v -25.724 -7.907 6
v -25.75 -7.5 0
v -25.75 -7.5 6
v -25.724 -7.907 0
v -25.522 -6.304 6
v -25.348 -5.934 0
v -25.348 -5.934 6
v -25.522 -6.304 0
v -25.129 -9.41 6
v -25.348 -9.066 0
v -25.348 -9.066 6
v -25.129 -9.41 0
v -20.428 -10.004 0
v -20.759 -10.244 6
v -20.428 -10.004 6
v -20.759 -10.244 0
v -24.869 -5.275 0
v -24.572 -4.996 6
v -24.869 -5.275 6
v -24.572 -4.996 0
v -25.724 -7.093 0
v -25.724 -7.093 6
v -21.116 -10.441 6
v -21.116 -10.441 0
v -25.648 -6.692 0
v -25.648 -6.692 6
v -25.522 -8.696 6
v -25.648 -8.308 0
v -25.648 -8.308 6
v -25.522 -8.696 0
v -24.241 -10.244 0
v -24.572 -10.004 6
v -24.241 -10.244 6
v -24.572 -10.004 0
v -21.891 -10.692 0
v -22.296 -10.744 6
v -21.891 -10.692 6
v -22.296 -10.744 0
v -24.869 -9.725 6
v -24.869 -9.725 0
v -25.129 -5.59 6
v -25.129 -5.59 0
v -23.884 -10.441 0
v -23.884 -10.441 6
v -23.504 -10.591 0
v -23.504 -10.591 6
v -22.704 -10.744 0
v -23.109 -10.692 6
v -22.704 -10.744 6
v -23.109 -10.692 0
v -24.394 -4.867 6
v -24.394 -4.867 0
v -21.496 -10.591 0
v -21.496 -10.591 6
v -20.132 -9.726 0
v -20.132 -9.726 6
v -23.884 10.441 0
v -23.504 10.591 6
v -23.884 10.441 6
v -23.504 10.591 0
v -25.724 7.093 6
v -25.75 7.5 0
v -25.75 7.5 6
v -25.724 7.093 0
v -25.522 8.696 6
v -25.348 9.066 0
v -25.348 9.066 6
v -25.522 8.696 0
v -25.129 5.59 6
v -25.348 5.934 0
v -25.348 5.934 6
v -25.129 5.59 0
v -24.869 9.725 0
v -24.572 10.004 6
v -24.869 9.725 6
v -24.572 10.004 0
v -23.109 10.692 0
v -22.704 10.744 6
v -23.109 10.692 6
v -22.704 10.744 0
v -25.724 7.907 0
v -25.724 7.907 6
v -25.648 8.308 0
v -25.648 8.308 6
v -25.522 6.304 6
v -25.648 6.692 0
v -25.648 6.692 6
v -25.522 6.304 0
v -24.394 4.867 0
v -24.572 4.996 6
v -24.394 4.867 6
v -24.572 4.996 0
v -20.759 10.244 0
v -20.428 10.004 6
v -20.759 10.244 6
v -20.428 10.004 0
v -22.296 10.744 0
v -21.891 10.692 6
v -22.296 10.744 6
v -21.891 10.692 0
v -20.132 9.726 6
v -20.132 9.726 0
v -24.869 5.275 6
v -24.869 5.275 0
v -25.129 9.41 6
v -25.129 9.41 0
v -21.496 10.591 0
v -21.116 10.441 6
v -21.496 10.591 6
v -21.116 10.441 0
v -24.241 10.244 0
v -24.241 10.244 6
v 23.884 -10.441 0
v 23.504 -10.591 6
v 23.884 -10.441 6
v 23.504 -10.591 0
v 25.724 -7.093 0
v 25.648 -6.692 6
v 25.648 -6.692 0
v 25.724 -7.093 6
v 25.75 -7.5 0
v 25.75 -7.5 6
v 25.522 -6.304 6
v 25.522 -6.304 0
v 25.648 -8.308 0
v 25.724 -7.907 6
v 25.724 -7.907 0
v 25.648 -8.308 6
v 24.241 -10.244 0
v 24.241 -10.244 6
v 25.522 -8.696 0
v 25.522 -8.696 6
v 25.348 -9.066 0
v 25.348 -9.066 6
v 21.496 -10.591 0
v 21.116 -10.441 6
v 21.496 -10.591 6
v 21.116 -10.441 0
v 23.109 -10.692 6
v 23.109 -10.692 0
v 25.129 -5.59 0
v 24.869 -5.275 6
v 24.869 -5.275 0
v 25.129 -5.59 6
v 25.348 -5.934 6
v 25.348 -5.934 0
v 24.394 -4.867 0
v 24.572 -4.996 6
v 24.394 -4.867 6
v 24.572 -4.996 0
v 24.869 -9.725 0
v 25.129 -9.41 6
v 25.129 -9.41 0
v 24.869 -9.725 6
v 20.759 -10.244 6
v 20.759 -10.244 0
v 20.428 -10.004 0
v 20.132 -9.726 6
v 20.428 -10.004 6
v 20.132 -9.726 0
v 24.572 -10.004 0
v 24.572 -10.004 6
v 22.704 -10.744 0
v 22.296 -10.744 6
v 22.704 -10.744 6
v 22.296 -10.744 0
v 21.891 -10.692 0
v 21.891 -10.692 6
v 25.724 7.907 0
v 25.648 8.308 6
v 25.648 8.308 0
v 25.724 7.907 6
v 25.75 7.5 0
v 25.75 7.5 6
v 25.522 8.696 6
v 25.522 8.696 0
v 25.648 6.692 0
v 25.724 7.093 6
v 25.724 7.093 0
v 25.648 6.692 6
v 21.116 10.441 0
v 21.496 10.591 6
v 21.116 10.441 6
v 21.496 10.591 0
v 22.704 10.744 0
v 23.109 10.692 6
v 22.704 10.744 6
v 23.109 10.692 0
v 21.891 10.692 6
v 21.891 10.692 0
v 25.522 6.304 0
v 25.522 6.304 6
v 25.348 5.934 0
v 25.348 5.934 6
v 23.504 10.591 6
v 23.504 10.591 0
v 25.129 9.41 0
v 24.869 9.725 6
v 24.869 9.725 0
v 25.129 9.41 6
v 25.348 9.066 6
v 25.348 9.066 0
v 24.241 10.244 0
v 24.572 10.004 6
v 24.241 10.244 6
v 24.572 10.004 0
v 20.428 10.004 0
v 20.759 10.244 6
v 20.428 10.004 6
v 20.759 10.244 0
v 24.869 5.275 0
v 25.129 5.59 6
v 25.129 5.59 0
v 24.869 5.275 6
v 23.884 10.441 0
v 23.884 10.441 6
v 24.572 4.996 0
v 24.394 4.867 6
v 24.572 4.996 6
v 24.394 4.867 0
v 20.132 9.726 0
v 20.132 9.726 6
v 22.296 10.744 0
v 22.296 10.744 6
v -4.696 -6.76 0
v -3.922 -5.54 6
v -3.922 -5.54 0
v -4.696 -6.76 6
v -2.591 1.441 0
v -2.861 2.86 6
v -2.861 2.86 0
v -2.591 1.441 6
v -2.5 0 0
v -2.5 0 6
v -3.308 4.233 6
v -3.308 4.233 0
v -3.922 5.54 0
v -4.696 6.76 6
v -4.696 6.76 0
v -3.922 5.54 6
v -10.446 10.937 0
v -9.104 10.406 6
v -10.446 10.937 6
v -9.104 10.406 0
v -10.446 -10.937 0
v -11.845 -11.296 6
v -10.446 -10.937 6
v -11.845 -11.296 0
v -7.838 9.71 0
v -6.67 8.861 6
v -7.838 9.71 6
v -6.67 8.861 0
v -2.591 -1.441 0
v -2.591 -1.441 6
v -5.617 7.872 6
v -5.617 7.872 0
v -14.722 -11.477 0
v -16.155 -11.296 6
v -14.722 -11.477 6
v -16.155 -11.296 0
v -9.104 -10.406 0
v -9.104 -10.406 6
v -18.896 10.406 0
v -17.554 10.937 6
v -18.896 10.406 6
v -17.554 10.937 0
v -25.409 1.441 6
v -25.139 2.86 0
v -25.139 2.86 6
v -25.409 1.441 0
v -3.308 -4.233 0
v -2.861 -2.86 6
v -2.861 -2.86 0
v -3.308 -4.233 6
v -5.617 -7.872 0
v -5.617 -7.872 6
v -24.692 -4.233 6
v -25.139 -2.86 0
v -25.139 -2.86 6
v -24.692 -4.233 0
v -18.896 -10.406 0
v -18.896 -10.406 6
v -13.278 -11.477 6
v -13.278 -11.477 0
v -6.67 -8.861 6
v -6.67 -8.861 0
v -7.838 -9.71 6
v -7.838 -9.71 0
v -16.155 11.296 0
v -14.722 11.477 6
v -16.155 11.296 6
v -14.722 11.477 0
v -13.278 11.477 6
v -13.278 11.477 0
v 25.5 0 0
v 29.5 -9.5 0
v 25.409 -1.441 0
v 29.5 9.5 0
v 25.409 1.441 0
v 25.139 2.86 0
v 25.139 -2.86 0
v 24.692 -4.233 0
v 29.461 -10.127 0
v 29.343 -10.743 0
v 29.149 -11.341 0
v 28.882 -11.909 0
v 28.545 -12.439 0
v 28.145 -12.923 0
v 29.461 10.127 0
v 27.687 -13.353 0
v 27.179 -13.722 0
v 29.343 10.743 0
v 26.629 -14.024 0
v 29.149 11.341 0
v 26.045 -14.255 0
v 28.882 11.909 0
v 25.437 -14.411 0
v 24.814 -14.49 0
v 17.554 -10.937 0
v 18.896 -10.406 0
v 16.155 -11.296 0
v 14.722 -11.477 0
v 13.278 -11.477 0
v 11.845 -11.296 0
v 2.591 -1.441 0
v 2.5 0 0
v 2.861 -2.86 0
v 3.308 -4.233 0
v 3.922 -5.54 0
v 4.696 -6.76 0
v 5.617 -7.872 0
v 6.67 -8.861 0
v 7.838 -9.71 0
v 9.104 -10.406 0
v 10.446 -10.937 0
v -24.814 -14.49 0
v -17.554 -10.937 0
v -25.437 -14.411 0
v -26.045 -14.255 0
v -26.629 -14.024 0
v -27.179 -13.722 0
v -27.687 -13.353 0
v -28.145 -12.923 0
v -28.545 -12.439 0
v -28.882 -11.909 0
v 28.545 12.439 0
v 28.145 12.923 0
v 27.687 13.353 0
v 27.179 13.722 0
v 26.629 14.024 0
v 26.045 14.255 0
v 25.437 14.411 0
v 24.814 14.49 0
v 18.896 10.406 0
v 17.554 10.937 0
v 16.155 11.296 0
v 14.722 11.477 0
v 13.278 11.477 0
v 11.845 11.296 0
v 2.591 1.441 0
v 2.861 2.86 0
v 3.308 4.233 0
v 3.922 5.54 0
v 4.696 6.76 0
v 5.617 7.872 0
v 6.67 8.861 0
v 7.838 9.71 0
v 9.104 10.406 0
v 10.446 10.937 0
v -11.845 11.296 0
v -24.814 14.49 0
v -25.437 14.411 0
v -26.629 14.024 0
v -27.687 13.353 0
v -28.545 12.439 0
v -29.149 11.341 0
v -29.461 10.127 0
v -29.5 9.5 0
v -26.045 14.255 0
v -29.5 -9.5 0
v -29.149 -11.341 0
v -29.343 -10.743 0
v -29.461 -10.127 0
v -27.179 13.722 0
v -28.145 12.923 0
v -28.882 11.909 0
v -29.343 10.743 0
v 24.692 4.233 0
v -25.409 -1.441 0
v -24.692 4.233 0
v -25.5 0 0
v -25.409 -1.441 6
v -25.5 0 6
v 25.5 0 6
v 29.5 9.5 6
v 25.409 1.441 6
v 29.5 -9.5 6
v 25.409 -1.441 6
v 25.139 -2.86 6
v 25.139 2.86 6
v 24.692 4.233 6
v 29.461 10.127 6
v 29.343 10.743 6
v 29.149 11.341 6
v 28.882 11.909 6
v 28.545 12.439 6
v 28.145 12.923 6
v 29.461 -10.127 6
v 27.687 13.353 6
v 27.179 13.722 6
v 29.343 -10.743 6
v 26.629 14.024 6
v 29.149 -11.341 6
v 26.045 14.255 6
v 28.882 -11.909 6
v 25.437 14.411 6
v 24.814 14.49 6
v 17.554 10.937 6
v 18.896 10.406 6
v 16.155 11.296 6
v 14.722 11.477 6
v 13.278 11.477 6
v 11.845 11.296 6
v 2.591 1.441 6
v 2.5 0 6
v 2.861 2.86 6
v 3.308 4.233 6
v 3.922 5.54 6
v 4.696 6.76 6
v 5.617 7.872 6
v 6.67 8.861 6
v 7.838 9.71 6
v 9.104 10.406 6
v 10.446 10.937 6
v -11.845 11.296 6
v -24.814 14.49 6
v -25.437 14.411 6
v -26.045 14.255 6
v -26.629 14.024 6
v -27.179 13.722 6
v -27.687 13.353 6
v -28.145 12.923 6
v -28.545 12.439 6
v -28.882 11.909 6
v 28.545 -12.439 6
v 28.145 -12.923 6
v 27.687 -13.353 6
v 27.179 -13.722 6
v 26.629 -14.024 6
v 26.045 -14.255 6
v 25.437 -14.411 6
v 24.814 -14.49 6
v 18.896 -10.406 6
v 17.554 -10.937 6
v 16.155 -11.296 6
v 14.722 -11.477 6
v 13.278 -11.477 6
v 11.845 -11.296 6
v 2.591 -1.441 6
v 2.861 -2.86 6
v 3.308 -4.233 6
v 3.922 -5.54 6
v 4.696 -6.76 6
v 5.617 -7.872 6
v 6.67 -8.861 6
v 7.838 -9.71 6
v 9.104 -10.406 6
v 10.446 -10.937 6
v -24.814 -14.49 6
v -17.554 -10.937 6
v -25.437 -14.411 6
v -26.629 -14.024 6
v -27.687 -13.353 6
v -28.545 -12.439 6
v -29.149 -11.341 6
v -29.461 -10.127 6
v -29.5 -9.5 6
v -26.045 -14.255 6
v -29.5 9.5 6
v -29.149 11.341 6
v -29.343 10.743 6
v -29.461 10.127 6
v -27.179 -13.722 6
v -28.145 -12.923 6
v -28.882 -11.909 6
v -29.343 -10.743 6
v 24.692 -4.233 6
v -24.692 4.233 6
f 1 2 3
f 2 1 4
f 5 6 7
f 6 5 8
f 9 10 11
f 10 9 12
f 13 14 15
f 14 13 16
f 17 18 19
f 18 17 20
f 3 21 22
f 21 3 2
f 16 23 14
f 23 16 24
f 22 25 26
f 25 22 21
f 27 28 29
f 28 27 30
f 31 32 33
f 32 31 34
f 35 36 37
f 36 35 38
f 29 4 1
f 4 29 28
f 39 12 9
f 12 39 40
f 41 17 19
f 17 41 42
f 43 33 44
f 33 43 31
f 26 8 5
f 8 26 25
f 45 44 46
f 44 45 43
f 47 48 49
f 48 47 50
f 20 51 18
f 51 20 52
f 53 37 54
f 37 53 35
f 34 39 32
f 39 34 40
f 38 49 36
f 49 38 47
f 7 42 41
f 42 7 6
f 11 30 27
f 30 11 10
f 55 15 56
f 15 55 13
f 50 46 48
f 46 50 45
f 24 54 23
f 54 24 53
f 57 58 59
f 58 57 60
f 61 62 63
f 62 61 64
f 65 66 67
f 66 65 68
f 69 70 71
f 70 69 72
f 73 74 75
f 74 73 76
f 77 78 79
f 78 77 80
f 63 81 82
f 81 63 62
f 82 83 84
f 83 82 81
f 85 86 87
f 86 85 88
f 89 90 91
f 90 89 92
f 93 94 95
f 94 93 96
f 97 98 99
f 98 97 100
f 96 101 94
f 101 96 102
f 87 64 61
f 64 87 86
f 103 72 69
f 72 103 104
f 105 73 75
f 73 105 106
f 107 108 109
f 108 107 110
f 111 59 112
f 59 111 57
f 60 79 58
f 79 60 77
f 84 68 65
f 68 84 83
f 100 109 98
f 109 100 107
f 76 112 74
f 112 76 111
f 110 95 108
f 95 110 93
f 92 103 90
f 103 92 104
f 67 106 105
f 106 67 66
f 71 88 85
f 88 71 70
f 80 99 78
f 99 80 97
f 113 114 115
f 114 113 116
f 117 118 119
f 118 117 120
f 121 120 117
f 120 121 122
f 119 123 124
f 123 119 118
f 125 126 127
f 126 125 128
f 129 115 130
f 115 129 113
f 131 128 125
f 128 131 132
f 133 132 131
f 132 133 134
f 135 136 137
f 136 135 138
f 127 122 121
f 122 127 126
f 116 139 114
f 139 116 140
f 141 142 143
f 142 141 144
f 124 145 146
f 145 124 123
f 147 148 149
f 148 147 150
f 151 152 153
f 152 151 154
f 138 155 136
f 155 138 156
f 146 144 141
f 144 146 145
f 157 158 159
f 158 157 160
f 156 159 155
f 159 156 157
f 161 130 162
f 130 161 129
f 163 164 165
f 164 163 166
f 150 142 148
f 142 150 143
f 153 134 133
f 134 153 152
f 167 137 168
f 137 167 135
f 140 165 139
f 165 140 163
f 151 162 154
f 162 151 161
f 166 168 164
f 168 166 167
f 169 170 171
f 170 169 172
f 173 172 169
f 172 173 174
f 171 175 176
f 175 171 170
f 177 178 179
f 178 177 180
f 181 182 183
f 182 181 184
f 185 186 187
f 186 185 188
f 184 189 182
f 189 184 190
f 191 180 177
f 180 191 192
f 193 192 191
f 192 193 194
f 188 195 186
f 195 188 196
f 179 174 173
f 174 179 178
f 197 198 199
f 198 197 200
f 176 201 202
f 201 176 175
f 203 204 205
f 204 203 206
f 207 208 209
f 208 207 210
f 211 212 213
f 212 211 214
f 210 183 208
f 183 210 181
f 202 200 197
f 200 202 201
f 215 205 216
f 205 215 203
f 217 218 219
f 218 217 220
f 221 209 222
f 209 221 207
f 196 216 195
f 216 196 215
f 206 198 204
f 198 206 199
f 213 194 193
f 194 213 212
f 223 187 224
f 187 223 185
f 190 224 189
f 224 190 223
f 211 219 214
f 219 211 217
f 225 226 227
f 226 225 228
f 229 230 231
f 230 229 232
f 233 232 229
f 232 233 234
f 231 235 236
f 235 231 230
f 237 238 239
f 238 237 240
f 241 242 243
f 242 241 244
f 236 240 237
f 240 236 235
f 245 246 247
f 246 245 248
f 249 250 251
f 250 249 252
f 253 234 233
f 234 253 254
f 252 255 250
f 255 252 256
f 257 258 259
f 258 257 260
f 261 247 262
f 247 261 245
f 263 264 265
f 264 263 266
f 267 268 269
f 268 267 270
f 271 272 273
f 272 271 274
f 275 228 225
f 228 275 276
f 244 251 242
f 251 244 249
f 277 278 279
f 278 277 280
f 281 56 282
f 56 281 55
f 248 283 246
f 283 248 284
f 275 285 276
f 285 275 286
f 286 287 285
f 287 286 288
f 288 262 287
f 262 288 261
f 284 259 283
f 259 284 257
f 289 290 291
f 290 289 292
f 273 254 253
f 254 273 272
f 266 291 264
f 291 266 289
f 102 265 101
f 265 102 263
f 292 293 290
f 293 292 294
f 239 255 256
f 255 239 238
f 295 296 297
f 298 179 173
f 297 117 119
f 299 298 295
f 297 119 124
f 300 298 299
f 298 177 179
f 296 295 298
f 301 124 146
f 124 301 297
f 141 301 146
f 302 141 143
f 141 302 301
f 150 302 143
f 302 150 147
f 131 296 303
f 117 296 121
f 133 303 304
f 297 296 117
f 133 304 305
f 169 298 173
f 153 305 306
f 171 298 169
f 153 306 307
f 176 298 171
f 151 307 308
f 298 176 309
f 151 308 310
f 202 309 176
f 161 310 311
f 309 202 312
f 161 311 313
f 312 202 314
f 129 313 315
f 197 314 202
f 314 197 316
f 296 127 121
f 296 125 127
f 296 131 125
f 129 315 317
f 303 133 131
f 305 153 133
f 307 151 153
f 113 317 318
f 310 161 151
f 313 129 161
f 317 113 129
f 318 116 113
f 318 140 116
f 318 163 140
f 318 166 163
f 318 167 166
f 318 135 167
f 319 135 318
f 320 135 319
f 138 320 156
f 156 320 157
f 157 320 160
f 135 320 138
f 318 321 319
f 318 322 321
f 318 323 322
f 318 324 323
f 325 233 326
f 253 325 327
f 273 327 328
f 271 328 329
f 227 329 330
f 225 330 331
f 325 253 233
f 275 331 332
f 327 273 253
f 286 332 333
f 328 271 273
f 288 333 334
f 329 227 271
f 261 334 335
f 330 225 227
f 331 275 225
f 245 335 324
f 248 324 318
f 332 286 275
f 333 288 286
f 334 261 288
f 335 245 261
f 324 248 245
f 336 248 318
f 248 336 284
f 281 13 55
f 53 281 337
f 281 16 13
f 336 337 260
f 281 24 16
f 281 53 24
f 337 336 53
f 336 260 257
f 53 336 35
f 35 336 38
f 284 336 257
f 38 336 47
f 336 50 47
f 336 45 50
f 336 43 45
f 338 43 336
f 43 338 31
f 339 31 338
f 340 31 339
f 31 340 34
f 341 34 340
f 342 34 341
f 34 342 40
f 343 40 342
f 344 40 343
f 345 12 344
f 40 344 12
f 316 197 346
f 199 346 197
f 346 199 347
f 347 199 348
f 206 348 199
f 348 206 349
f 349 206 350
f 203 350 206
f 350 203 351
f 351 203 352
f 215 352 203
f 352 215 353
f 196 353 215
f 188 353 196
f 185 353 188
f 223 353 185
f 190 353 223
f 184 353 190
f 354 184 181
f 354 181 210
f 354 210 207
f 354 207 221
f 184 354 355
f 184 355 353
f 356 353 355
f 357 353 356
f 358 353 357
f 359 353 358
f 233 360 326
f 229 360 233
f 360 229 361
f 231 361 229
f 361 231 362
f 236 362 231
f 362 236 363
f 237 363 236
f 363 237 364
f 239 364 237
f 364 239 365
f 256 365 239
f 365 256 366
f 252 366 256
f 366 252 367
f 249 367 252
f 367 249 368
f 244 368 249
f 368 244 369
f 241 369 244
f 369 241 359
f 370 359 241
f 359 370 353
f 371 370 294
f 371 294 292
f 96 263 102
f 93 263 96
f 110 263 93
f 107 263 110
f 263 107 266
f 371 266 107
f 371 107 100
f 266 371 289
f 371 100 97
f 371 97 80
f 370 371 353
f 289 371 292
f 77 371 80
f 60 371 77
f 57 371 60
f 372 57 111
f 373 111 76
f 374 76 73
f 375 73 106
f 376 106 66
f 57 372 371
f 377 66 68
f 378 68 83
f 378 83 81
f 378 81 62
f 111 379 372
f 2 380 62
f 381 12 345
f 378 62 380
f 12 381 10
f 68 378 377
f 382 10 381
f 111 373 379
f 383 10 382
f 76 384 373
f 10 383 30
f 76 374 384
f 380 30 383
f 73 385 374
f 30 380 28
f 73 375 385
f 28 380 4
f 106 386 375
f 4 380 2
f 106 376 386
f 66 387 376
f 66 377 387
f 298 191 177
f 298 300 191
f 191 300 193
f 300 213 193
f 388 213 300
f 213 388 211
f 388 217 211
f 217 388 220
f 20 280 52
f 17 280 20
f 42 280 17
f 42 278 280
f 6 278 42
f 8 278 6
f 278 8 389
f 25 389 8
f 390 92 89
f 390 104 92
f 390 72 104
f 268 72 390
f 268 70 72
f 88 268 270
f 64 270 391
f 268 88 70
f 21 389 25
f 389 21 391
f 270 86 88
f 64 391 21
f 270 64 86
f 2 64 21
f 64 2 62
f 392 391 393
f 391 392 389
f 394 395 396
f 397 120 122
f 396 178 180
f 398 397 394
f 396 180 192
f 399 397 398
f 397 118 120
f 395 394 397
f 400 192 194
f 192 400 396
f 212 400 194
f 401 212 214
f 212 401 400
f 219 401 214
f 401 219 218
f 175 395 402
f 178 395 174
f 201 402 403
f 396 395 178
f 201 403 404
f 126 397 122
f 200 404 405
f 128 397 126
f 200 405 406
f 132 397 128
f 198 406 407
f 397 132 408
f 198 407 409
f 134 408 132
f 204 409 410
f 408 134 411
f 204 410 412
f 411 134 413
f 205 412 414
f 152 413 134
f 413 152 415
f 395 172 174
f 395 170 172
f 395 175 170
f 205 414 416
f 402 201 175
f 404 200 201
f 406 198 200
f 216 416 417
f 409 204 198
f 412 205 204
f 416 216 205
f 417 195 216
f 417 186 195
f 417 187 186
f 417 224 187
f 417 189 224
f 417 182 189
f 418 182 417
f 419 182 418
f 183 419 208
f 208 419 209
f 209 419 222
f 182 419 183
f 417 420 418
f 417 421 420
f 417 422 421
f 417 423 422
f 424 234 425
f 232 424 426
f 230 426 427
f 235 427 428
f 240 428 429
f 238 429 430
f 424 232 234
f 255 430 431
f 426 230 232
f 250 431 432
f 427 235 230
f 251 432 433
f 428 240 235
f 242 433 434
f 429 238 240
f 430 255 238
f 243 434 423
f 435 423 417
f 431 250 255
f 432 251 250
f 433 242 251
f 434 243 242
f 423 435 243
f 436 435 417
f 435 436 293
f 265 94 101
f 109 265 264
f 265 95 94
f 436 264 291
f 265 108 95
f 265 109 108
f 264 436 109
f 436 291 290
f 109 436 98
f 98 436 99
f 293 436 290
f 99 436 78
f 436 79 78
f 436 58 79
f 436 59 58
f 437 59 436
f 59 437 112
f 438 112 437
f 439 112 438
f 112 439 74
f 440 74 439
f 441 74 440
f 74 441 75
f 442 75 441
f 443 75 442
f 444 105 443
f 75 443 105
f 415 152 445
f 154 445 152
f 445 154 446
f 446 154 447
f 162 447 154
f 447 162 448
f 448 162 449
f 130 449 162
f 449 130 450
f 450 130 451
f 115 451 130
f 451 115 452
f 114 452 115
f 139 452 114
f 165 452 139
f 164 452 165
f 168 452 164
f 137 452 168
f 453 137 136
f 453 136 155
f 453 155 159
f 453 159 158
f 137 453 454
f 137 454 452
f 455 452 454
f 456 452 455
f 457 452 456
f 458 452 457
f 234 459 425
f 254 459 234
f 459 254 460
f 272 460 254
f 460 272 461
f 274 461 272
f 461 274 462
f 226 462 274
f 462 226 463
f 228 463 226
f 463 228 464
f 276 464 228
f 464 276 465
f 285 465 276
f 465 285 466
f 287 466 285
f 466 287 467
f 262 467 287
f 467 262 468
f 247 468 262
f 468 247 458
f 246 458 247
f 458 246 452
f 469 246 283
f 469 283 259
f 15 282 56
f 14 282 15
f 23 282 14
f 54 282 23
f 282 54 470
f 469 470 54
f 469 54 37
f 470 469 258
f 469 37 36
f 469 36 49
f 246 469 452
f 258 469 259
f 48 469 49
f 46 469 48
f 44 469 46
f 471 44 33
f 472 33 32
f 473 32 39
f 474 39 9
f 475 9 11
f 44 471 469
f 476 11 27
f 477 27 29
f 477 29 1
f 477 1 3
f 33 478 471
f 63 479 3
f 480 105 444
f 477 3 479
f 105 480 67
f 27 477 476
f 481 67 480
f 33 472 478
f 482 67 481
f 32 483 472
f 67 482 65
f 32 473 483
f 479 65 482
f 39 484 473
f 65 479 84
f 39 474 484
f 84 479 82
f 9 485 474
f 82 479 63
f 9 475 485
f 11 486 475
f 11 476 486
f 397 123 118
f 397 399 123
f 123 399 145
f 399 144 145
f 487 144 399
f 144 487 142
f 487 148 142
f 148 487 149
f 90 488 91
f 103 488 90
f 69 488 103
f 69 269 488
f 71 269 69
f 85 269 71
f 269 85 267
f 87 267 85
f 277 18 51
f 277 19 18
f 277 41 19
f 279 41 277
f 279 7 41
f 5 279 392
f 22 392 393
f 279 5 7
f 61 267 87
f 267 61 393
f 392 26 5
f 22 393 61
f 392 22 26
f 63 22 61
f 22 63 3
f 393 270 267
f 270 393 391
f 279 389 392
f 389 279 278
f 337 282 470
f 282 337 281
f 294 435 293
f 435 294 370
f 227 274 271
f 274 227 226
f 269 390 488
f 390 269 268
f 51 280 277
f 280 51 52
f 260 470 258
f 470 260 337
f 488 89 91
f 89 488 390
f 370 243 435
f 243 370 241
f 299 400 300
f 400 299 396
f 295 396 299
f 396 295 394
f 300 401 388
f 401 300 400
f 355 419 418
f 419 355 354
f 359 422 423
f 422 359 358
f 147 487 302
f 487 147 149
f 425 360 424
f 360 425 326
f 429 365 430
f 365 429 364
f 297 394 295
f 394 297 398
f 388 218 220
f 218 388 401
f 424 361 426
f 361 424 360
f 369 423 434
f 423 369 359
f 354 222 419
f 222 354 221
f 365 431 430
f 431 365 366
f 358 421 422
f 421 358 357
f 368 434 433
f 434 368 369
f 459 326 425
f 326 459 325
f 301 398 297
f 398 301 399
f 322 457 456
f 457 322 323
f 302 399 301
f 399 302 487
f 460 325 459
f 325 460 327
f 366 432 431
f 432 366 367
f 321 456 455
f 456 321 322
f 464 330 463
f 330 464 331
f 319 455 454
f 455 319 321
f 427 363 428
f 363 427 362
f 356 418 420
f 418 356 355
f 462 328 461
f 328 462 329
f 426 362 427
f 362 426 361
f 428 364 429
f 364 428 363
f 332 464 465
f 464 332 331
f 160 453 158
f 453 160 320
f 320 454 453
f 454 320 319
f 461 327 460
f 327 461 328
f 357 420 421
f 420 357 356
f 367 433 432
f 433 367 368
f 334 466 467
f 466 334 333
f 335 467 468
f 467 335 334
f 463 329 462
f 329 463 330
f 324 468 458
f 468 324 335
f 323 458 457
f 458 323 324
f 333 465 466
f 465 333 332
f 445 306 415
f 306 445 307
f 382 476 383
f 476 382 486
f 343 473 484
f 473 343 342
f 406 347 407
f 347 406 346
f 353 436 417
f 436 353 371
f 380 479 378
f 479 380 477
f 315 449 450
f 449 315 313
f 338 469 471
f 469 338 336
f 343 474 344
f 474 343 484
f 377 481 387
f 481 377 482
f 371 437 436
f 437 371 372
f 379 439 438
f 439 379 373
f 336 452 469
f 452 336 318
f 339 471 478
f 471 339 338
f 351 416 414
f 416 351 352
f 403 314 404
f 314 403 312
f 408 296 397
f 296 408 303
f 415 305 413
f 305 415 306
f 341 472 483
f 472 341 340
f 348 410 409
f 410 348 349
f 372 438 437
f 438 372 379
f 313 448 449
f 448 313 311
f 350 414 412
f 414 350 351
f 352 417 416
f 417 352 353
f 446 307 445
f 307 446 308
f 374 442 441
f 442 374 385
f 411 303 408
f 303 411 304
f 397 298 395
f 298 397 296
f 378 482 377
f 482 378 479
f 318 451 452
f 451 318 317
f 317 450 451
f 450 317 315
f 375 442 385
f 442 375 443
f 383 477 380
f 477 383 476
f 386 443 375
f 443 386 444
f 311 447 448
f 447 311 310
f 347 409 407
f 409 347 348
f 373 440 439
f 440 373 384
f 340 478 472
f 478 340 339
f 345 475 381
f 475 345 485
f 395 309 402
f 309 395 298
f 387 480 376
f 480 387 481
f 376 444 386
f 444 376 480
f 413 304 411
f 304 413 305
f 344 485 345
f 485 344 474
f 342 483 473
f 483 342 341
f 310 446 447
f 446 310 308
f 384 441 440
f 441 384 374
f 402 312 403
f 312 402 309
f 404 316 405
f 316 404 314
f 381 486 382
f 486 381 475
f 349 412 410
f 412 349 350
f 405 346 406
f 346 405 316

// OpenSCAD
$fn = 50;

difference() {
	union() {
		hull() {
			translate(v = [-24.5, 9.5, 0]) {
				cylinder(h = 6, r = 5);
			}
			translate(v = [24.5, 9.5, 0]) {
				cylinder(h = 6, r = 5);
			}
			translate(v = [-24.5, -9.5, 0]) {
				cylinder(h = 6, r = 5);
			}
			translate(v = [24.5, -9.5, 0]) {
				cylinder(h = 6, r = 5);
			}
		}
	}
	union() {
		translate(v = [-22.5, -7.5, -100.0]) {
			cylinder(h = 200, r = 3.25);
		}
		translate(v = [-22.5, 7.5, -100.0]) {
			cylinder(h = 200, r = 3.25);
		}
		translate(v = [22.5, -7.5, -100.0]) {
			cylinder(h = 200, r = 3.25);
		}
		translate(v = [22.5, 7.5, -100.0]) {
			cylinder(h = 200, r = 3.25);
		}
		translate(v = [-22.5, -7.5, -100.0]) {
			cylinder(h = 200, r = 1.8);
		}
		translate(v = [-22.5, 7.5, -100.0]) {
			cylinder(h = 200, r = 1.8);
		}
		translate(v = [22.5, -7.5, -100.0]) {
			cylinder(h = 200, r = 1.8);
		}
		translate(v = [22.5, 7.5, -100.0]) {
			cylinder(h = 200, r = 1.8);
		}
		translate(v = [-14.0, 0, 0.0]) {
			cylinder(h = 6, r = 11.5);
		}
		translate(v = [14.0, 0, 0.0]) {
			cylinder(h = 6, r = 11.5);
		}
	}
}
